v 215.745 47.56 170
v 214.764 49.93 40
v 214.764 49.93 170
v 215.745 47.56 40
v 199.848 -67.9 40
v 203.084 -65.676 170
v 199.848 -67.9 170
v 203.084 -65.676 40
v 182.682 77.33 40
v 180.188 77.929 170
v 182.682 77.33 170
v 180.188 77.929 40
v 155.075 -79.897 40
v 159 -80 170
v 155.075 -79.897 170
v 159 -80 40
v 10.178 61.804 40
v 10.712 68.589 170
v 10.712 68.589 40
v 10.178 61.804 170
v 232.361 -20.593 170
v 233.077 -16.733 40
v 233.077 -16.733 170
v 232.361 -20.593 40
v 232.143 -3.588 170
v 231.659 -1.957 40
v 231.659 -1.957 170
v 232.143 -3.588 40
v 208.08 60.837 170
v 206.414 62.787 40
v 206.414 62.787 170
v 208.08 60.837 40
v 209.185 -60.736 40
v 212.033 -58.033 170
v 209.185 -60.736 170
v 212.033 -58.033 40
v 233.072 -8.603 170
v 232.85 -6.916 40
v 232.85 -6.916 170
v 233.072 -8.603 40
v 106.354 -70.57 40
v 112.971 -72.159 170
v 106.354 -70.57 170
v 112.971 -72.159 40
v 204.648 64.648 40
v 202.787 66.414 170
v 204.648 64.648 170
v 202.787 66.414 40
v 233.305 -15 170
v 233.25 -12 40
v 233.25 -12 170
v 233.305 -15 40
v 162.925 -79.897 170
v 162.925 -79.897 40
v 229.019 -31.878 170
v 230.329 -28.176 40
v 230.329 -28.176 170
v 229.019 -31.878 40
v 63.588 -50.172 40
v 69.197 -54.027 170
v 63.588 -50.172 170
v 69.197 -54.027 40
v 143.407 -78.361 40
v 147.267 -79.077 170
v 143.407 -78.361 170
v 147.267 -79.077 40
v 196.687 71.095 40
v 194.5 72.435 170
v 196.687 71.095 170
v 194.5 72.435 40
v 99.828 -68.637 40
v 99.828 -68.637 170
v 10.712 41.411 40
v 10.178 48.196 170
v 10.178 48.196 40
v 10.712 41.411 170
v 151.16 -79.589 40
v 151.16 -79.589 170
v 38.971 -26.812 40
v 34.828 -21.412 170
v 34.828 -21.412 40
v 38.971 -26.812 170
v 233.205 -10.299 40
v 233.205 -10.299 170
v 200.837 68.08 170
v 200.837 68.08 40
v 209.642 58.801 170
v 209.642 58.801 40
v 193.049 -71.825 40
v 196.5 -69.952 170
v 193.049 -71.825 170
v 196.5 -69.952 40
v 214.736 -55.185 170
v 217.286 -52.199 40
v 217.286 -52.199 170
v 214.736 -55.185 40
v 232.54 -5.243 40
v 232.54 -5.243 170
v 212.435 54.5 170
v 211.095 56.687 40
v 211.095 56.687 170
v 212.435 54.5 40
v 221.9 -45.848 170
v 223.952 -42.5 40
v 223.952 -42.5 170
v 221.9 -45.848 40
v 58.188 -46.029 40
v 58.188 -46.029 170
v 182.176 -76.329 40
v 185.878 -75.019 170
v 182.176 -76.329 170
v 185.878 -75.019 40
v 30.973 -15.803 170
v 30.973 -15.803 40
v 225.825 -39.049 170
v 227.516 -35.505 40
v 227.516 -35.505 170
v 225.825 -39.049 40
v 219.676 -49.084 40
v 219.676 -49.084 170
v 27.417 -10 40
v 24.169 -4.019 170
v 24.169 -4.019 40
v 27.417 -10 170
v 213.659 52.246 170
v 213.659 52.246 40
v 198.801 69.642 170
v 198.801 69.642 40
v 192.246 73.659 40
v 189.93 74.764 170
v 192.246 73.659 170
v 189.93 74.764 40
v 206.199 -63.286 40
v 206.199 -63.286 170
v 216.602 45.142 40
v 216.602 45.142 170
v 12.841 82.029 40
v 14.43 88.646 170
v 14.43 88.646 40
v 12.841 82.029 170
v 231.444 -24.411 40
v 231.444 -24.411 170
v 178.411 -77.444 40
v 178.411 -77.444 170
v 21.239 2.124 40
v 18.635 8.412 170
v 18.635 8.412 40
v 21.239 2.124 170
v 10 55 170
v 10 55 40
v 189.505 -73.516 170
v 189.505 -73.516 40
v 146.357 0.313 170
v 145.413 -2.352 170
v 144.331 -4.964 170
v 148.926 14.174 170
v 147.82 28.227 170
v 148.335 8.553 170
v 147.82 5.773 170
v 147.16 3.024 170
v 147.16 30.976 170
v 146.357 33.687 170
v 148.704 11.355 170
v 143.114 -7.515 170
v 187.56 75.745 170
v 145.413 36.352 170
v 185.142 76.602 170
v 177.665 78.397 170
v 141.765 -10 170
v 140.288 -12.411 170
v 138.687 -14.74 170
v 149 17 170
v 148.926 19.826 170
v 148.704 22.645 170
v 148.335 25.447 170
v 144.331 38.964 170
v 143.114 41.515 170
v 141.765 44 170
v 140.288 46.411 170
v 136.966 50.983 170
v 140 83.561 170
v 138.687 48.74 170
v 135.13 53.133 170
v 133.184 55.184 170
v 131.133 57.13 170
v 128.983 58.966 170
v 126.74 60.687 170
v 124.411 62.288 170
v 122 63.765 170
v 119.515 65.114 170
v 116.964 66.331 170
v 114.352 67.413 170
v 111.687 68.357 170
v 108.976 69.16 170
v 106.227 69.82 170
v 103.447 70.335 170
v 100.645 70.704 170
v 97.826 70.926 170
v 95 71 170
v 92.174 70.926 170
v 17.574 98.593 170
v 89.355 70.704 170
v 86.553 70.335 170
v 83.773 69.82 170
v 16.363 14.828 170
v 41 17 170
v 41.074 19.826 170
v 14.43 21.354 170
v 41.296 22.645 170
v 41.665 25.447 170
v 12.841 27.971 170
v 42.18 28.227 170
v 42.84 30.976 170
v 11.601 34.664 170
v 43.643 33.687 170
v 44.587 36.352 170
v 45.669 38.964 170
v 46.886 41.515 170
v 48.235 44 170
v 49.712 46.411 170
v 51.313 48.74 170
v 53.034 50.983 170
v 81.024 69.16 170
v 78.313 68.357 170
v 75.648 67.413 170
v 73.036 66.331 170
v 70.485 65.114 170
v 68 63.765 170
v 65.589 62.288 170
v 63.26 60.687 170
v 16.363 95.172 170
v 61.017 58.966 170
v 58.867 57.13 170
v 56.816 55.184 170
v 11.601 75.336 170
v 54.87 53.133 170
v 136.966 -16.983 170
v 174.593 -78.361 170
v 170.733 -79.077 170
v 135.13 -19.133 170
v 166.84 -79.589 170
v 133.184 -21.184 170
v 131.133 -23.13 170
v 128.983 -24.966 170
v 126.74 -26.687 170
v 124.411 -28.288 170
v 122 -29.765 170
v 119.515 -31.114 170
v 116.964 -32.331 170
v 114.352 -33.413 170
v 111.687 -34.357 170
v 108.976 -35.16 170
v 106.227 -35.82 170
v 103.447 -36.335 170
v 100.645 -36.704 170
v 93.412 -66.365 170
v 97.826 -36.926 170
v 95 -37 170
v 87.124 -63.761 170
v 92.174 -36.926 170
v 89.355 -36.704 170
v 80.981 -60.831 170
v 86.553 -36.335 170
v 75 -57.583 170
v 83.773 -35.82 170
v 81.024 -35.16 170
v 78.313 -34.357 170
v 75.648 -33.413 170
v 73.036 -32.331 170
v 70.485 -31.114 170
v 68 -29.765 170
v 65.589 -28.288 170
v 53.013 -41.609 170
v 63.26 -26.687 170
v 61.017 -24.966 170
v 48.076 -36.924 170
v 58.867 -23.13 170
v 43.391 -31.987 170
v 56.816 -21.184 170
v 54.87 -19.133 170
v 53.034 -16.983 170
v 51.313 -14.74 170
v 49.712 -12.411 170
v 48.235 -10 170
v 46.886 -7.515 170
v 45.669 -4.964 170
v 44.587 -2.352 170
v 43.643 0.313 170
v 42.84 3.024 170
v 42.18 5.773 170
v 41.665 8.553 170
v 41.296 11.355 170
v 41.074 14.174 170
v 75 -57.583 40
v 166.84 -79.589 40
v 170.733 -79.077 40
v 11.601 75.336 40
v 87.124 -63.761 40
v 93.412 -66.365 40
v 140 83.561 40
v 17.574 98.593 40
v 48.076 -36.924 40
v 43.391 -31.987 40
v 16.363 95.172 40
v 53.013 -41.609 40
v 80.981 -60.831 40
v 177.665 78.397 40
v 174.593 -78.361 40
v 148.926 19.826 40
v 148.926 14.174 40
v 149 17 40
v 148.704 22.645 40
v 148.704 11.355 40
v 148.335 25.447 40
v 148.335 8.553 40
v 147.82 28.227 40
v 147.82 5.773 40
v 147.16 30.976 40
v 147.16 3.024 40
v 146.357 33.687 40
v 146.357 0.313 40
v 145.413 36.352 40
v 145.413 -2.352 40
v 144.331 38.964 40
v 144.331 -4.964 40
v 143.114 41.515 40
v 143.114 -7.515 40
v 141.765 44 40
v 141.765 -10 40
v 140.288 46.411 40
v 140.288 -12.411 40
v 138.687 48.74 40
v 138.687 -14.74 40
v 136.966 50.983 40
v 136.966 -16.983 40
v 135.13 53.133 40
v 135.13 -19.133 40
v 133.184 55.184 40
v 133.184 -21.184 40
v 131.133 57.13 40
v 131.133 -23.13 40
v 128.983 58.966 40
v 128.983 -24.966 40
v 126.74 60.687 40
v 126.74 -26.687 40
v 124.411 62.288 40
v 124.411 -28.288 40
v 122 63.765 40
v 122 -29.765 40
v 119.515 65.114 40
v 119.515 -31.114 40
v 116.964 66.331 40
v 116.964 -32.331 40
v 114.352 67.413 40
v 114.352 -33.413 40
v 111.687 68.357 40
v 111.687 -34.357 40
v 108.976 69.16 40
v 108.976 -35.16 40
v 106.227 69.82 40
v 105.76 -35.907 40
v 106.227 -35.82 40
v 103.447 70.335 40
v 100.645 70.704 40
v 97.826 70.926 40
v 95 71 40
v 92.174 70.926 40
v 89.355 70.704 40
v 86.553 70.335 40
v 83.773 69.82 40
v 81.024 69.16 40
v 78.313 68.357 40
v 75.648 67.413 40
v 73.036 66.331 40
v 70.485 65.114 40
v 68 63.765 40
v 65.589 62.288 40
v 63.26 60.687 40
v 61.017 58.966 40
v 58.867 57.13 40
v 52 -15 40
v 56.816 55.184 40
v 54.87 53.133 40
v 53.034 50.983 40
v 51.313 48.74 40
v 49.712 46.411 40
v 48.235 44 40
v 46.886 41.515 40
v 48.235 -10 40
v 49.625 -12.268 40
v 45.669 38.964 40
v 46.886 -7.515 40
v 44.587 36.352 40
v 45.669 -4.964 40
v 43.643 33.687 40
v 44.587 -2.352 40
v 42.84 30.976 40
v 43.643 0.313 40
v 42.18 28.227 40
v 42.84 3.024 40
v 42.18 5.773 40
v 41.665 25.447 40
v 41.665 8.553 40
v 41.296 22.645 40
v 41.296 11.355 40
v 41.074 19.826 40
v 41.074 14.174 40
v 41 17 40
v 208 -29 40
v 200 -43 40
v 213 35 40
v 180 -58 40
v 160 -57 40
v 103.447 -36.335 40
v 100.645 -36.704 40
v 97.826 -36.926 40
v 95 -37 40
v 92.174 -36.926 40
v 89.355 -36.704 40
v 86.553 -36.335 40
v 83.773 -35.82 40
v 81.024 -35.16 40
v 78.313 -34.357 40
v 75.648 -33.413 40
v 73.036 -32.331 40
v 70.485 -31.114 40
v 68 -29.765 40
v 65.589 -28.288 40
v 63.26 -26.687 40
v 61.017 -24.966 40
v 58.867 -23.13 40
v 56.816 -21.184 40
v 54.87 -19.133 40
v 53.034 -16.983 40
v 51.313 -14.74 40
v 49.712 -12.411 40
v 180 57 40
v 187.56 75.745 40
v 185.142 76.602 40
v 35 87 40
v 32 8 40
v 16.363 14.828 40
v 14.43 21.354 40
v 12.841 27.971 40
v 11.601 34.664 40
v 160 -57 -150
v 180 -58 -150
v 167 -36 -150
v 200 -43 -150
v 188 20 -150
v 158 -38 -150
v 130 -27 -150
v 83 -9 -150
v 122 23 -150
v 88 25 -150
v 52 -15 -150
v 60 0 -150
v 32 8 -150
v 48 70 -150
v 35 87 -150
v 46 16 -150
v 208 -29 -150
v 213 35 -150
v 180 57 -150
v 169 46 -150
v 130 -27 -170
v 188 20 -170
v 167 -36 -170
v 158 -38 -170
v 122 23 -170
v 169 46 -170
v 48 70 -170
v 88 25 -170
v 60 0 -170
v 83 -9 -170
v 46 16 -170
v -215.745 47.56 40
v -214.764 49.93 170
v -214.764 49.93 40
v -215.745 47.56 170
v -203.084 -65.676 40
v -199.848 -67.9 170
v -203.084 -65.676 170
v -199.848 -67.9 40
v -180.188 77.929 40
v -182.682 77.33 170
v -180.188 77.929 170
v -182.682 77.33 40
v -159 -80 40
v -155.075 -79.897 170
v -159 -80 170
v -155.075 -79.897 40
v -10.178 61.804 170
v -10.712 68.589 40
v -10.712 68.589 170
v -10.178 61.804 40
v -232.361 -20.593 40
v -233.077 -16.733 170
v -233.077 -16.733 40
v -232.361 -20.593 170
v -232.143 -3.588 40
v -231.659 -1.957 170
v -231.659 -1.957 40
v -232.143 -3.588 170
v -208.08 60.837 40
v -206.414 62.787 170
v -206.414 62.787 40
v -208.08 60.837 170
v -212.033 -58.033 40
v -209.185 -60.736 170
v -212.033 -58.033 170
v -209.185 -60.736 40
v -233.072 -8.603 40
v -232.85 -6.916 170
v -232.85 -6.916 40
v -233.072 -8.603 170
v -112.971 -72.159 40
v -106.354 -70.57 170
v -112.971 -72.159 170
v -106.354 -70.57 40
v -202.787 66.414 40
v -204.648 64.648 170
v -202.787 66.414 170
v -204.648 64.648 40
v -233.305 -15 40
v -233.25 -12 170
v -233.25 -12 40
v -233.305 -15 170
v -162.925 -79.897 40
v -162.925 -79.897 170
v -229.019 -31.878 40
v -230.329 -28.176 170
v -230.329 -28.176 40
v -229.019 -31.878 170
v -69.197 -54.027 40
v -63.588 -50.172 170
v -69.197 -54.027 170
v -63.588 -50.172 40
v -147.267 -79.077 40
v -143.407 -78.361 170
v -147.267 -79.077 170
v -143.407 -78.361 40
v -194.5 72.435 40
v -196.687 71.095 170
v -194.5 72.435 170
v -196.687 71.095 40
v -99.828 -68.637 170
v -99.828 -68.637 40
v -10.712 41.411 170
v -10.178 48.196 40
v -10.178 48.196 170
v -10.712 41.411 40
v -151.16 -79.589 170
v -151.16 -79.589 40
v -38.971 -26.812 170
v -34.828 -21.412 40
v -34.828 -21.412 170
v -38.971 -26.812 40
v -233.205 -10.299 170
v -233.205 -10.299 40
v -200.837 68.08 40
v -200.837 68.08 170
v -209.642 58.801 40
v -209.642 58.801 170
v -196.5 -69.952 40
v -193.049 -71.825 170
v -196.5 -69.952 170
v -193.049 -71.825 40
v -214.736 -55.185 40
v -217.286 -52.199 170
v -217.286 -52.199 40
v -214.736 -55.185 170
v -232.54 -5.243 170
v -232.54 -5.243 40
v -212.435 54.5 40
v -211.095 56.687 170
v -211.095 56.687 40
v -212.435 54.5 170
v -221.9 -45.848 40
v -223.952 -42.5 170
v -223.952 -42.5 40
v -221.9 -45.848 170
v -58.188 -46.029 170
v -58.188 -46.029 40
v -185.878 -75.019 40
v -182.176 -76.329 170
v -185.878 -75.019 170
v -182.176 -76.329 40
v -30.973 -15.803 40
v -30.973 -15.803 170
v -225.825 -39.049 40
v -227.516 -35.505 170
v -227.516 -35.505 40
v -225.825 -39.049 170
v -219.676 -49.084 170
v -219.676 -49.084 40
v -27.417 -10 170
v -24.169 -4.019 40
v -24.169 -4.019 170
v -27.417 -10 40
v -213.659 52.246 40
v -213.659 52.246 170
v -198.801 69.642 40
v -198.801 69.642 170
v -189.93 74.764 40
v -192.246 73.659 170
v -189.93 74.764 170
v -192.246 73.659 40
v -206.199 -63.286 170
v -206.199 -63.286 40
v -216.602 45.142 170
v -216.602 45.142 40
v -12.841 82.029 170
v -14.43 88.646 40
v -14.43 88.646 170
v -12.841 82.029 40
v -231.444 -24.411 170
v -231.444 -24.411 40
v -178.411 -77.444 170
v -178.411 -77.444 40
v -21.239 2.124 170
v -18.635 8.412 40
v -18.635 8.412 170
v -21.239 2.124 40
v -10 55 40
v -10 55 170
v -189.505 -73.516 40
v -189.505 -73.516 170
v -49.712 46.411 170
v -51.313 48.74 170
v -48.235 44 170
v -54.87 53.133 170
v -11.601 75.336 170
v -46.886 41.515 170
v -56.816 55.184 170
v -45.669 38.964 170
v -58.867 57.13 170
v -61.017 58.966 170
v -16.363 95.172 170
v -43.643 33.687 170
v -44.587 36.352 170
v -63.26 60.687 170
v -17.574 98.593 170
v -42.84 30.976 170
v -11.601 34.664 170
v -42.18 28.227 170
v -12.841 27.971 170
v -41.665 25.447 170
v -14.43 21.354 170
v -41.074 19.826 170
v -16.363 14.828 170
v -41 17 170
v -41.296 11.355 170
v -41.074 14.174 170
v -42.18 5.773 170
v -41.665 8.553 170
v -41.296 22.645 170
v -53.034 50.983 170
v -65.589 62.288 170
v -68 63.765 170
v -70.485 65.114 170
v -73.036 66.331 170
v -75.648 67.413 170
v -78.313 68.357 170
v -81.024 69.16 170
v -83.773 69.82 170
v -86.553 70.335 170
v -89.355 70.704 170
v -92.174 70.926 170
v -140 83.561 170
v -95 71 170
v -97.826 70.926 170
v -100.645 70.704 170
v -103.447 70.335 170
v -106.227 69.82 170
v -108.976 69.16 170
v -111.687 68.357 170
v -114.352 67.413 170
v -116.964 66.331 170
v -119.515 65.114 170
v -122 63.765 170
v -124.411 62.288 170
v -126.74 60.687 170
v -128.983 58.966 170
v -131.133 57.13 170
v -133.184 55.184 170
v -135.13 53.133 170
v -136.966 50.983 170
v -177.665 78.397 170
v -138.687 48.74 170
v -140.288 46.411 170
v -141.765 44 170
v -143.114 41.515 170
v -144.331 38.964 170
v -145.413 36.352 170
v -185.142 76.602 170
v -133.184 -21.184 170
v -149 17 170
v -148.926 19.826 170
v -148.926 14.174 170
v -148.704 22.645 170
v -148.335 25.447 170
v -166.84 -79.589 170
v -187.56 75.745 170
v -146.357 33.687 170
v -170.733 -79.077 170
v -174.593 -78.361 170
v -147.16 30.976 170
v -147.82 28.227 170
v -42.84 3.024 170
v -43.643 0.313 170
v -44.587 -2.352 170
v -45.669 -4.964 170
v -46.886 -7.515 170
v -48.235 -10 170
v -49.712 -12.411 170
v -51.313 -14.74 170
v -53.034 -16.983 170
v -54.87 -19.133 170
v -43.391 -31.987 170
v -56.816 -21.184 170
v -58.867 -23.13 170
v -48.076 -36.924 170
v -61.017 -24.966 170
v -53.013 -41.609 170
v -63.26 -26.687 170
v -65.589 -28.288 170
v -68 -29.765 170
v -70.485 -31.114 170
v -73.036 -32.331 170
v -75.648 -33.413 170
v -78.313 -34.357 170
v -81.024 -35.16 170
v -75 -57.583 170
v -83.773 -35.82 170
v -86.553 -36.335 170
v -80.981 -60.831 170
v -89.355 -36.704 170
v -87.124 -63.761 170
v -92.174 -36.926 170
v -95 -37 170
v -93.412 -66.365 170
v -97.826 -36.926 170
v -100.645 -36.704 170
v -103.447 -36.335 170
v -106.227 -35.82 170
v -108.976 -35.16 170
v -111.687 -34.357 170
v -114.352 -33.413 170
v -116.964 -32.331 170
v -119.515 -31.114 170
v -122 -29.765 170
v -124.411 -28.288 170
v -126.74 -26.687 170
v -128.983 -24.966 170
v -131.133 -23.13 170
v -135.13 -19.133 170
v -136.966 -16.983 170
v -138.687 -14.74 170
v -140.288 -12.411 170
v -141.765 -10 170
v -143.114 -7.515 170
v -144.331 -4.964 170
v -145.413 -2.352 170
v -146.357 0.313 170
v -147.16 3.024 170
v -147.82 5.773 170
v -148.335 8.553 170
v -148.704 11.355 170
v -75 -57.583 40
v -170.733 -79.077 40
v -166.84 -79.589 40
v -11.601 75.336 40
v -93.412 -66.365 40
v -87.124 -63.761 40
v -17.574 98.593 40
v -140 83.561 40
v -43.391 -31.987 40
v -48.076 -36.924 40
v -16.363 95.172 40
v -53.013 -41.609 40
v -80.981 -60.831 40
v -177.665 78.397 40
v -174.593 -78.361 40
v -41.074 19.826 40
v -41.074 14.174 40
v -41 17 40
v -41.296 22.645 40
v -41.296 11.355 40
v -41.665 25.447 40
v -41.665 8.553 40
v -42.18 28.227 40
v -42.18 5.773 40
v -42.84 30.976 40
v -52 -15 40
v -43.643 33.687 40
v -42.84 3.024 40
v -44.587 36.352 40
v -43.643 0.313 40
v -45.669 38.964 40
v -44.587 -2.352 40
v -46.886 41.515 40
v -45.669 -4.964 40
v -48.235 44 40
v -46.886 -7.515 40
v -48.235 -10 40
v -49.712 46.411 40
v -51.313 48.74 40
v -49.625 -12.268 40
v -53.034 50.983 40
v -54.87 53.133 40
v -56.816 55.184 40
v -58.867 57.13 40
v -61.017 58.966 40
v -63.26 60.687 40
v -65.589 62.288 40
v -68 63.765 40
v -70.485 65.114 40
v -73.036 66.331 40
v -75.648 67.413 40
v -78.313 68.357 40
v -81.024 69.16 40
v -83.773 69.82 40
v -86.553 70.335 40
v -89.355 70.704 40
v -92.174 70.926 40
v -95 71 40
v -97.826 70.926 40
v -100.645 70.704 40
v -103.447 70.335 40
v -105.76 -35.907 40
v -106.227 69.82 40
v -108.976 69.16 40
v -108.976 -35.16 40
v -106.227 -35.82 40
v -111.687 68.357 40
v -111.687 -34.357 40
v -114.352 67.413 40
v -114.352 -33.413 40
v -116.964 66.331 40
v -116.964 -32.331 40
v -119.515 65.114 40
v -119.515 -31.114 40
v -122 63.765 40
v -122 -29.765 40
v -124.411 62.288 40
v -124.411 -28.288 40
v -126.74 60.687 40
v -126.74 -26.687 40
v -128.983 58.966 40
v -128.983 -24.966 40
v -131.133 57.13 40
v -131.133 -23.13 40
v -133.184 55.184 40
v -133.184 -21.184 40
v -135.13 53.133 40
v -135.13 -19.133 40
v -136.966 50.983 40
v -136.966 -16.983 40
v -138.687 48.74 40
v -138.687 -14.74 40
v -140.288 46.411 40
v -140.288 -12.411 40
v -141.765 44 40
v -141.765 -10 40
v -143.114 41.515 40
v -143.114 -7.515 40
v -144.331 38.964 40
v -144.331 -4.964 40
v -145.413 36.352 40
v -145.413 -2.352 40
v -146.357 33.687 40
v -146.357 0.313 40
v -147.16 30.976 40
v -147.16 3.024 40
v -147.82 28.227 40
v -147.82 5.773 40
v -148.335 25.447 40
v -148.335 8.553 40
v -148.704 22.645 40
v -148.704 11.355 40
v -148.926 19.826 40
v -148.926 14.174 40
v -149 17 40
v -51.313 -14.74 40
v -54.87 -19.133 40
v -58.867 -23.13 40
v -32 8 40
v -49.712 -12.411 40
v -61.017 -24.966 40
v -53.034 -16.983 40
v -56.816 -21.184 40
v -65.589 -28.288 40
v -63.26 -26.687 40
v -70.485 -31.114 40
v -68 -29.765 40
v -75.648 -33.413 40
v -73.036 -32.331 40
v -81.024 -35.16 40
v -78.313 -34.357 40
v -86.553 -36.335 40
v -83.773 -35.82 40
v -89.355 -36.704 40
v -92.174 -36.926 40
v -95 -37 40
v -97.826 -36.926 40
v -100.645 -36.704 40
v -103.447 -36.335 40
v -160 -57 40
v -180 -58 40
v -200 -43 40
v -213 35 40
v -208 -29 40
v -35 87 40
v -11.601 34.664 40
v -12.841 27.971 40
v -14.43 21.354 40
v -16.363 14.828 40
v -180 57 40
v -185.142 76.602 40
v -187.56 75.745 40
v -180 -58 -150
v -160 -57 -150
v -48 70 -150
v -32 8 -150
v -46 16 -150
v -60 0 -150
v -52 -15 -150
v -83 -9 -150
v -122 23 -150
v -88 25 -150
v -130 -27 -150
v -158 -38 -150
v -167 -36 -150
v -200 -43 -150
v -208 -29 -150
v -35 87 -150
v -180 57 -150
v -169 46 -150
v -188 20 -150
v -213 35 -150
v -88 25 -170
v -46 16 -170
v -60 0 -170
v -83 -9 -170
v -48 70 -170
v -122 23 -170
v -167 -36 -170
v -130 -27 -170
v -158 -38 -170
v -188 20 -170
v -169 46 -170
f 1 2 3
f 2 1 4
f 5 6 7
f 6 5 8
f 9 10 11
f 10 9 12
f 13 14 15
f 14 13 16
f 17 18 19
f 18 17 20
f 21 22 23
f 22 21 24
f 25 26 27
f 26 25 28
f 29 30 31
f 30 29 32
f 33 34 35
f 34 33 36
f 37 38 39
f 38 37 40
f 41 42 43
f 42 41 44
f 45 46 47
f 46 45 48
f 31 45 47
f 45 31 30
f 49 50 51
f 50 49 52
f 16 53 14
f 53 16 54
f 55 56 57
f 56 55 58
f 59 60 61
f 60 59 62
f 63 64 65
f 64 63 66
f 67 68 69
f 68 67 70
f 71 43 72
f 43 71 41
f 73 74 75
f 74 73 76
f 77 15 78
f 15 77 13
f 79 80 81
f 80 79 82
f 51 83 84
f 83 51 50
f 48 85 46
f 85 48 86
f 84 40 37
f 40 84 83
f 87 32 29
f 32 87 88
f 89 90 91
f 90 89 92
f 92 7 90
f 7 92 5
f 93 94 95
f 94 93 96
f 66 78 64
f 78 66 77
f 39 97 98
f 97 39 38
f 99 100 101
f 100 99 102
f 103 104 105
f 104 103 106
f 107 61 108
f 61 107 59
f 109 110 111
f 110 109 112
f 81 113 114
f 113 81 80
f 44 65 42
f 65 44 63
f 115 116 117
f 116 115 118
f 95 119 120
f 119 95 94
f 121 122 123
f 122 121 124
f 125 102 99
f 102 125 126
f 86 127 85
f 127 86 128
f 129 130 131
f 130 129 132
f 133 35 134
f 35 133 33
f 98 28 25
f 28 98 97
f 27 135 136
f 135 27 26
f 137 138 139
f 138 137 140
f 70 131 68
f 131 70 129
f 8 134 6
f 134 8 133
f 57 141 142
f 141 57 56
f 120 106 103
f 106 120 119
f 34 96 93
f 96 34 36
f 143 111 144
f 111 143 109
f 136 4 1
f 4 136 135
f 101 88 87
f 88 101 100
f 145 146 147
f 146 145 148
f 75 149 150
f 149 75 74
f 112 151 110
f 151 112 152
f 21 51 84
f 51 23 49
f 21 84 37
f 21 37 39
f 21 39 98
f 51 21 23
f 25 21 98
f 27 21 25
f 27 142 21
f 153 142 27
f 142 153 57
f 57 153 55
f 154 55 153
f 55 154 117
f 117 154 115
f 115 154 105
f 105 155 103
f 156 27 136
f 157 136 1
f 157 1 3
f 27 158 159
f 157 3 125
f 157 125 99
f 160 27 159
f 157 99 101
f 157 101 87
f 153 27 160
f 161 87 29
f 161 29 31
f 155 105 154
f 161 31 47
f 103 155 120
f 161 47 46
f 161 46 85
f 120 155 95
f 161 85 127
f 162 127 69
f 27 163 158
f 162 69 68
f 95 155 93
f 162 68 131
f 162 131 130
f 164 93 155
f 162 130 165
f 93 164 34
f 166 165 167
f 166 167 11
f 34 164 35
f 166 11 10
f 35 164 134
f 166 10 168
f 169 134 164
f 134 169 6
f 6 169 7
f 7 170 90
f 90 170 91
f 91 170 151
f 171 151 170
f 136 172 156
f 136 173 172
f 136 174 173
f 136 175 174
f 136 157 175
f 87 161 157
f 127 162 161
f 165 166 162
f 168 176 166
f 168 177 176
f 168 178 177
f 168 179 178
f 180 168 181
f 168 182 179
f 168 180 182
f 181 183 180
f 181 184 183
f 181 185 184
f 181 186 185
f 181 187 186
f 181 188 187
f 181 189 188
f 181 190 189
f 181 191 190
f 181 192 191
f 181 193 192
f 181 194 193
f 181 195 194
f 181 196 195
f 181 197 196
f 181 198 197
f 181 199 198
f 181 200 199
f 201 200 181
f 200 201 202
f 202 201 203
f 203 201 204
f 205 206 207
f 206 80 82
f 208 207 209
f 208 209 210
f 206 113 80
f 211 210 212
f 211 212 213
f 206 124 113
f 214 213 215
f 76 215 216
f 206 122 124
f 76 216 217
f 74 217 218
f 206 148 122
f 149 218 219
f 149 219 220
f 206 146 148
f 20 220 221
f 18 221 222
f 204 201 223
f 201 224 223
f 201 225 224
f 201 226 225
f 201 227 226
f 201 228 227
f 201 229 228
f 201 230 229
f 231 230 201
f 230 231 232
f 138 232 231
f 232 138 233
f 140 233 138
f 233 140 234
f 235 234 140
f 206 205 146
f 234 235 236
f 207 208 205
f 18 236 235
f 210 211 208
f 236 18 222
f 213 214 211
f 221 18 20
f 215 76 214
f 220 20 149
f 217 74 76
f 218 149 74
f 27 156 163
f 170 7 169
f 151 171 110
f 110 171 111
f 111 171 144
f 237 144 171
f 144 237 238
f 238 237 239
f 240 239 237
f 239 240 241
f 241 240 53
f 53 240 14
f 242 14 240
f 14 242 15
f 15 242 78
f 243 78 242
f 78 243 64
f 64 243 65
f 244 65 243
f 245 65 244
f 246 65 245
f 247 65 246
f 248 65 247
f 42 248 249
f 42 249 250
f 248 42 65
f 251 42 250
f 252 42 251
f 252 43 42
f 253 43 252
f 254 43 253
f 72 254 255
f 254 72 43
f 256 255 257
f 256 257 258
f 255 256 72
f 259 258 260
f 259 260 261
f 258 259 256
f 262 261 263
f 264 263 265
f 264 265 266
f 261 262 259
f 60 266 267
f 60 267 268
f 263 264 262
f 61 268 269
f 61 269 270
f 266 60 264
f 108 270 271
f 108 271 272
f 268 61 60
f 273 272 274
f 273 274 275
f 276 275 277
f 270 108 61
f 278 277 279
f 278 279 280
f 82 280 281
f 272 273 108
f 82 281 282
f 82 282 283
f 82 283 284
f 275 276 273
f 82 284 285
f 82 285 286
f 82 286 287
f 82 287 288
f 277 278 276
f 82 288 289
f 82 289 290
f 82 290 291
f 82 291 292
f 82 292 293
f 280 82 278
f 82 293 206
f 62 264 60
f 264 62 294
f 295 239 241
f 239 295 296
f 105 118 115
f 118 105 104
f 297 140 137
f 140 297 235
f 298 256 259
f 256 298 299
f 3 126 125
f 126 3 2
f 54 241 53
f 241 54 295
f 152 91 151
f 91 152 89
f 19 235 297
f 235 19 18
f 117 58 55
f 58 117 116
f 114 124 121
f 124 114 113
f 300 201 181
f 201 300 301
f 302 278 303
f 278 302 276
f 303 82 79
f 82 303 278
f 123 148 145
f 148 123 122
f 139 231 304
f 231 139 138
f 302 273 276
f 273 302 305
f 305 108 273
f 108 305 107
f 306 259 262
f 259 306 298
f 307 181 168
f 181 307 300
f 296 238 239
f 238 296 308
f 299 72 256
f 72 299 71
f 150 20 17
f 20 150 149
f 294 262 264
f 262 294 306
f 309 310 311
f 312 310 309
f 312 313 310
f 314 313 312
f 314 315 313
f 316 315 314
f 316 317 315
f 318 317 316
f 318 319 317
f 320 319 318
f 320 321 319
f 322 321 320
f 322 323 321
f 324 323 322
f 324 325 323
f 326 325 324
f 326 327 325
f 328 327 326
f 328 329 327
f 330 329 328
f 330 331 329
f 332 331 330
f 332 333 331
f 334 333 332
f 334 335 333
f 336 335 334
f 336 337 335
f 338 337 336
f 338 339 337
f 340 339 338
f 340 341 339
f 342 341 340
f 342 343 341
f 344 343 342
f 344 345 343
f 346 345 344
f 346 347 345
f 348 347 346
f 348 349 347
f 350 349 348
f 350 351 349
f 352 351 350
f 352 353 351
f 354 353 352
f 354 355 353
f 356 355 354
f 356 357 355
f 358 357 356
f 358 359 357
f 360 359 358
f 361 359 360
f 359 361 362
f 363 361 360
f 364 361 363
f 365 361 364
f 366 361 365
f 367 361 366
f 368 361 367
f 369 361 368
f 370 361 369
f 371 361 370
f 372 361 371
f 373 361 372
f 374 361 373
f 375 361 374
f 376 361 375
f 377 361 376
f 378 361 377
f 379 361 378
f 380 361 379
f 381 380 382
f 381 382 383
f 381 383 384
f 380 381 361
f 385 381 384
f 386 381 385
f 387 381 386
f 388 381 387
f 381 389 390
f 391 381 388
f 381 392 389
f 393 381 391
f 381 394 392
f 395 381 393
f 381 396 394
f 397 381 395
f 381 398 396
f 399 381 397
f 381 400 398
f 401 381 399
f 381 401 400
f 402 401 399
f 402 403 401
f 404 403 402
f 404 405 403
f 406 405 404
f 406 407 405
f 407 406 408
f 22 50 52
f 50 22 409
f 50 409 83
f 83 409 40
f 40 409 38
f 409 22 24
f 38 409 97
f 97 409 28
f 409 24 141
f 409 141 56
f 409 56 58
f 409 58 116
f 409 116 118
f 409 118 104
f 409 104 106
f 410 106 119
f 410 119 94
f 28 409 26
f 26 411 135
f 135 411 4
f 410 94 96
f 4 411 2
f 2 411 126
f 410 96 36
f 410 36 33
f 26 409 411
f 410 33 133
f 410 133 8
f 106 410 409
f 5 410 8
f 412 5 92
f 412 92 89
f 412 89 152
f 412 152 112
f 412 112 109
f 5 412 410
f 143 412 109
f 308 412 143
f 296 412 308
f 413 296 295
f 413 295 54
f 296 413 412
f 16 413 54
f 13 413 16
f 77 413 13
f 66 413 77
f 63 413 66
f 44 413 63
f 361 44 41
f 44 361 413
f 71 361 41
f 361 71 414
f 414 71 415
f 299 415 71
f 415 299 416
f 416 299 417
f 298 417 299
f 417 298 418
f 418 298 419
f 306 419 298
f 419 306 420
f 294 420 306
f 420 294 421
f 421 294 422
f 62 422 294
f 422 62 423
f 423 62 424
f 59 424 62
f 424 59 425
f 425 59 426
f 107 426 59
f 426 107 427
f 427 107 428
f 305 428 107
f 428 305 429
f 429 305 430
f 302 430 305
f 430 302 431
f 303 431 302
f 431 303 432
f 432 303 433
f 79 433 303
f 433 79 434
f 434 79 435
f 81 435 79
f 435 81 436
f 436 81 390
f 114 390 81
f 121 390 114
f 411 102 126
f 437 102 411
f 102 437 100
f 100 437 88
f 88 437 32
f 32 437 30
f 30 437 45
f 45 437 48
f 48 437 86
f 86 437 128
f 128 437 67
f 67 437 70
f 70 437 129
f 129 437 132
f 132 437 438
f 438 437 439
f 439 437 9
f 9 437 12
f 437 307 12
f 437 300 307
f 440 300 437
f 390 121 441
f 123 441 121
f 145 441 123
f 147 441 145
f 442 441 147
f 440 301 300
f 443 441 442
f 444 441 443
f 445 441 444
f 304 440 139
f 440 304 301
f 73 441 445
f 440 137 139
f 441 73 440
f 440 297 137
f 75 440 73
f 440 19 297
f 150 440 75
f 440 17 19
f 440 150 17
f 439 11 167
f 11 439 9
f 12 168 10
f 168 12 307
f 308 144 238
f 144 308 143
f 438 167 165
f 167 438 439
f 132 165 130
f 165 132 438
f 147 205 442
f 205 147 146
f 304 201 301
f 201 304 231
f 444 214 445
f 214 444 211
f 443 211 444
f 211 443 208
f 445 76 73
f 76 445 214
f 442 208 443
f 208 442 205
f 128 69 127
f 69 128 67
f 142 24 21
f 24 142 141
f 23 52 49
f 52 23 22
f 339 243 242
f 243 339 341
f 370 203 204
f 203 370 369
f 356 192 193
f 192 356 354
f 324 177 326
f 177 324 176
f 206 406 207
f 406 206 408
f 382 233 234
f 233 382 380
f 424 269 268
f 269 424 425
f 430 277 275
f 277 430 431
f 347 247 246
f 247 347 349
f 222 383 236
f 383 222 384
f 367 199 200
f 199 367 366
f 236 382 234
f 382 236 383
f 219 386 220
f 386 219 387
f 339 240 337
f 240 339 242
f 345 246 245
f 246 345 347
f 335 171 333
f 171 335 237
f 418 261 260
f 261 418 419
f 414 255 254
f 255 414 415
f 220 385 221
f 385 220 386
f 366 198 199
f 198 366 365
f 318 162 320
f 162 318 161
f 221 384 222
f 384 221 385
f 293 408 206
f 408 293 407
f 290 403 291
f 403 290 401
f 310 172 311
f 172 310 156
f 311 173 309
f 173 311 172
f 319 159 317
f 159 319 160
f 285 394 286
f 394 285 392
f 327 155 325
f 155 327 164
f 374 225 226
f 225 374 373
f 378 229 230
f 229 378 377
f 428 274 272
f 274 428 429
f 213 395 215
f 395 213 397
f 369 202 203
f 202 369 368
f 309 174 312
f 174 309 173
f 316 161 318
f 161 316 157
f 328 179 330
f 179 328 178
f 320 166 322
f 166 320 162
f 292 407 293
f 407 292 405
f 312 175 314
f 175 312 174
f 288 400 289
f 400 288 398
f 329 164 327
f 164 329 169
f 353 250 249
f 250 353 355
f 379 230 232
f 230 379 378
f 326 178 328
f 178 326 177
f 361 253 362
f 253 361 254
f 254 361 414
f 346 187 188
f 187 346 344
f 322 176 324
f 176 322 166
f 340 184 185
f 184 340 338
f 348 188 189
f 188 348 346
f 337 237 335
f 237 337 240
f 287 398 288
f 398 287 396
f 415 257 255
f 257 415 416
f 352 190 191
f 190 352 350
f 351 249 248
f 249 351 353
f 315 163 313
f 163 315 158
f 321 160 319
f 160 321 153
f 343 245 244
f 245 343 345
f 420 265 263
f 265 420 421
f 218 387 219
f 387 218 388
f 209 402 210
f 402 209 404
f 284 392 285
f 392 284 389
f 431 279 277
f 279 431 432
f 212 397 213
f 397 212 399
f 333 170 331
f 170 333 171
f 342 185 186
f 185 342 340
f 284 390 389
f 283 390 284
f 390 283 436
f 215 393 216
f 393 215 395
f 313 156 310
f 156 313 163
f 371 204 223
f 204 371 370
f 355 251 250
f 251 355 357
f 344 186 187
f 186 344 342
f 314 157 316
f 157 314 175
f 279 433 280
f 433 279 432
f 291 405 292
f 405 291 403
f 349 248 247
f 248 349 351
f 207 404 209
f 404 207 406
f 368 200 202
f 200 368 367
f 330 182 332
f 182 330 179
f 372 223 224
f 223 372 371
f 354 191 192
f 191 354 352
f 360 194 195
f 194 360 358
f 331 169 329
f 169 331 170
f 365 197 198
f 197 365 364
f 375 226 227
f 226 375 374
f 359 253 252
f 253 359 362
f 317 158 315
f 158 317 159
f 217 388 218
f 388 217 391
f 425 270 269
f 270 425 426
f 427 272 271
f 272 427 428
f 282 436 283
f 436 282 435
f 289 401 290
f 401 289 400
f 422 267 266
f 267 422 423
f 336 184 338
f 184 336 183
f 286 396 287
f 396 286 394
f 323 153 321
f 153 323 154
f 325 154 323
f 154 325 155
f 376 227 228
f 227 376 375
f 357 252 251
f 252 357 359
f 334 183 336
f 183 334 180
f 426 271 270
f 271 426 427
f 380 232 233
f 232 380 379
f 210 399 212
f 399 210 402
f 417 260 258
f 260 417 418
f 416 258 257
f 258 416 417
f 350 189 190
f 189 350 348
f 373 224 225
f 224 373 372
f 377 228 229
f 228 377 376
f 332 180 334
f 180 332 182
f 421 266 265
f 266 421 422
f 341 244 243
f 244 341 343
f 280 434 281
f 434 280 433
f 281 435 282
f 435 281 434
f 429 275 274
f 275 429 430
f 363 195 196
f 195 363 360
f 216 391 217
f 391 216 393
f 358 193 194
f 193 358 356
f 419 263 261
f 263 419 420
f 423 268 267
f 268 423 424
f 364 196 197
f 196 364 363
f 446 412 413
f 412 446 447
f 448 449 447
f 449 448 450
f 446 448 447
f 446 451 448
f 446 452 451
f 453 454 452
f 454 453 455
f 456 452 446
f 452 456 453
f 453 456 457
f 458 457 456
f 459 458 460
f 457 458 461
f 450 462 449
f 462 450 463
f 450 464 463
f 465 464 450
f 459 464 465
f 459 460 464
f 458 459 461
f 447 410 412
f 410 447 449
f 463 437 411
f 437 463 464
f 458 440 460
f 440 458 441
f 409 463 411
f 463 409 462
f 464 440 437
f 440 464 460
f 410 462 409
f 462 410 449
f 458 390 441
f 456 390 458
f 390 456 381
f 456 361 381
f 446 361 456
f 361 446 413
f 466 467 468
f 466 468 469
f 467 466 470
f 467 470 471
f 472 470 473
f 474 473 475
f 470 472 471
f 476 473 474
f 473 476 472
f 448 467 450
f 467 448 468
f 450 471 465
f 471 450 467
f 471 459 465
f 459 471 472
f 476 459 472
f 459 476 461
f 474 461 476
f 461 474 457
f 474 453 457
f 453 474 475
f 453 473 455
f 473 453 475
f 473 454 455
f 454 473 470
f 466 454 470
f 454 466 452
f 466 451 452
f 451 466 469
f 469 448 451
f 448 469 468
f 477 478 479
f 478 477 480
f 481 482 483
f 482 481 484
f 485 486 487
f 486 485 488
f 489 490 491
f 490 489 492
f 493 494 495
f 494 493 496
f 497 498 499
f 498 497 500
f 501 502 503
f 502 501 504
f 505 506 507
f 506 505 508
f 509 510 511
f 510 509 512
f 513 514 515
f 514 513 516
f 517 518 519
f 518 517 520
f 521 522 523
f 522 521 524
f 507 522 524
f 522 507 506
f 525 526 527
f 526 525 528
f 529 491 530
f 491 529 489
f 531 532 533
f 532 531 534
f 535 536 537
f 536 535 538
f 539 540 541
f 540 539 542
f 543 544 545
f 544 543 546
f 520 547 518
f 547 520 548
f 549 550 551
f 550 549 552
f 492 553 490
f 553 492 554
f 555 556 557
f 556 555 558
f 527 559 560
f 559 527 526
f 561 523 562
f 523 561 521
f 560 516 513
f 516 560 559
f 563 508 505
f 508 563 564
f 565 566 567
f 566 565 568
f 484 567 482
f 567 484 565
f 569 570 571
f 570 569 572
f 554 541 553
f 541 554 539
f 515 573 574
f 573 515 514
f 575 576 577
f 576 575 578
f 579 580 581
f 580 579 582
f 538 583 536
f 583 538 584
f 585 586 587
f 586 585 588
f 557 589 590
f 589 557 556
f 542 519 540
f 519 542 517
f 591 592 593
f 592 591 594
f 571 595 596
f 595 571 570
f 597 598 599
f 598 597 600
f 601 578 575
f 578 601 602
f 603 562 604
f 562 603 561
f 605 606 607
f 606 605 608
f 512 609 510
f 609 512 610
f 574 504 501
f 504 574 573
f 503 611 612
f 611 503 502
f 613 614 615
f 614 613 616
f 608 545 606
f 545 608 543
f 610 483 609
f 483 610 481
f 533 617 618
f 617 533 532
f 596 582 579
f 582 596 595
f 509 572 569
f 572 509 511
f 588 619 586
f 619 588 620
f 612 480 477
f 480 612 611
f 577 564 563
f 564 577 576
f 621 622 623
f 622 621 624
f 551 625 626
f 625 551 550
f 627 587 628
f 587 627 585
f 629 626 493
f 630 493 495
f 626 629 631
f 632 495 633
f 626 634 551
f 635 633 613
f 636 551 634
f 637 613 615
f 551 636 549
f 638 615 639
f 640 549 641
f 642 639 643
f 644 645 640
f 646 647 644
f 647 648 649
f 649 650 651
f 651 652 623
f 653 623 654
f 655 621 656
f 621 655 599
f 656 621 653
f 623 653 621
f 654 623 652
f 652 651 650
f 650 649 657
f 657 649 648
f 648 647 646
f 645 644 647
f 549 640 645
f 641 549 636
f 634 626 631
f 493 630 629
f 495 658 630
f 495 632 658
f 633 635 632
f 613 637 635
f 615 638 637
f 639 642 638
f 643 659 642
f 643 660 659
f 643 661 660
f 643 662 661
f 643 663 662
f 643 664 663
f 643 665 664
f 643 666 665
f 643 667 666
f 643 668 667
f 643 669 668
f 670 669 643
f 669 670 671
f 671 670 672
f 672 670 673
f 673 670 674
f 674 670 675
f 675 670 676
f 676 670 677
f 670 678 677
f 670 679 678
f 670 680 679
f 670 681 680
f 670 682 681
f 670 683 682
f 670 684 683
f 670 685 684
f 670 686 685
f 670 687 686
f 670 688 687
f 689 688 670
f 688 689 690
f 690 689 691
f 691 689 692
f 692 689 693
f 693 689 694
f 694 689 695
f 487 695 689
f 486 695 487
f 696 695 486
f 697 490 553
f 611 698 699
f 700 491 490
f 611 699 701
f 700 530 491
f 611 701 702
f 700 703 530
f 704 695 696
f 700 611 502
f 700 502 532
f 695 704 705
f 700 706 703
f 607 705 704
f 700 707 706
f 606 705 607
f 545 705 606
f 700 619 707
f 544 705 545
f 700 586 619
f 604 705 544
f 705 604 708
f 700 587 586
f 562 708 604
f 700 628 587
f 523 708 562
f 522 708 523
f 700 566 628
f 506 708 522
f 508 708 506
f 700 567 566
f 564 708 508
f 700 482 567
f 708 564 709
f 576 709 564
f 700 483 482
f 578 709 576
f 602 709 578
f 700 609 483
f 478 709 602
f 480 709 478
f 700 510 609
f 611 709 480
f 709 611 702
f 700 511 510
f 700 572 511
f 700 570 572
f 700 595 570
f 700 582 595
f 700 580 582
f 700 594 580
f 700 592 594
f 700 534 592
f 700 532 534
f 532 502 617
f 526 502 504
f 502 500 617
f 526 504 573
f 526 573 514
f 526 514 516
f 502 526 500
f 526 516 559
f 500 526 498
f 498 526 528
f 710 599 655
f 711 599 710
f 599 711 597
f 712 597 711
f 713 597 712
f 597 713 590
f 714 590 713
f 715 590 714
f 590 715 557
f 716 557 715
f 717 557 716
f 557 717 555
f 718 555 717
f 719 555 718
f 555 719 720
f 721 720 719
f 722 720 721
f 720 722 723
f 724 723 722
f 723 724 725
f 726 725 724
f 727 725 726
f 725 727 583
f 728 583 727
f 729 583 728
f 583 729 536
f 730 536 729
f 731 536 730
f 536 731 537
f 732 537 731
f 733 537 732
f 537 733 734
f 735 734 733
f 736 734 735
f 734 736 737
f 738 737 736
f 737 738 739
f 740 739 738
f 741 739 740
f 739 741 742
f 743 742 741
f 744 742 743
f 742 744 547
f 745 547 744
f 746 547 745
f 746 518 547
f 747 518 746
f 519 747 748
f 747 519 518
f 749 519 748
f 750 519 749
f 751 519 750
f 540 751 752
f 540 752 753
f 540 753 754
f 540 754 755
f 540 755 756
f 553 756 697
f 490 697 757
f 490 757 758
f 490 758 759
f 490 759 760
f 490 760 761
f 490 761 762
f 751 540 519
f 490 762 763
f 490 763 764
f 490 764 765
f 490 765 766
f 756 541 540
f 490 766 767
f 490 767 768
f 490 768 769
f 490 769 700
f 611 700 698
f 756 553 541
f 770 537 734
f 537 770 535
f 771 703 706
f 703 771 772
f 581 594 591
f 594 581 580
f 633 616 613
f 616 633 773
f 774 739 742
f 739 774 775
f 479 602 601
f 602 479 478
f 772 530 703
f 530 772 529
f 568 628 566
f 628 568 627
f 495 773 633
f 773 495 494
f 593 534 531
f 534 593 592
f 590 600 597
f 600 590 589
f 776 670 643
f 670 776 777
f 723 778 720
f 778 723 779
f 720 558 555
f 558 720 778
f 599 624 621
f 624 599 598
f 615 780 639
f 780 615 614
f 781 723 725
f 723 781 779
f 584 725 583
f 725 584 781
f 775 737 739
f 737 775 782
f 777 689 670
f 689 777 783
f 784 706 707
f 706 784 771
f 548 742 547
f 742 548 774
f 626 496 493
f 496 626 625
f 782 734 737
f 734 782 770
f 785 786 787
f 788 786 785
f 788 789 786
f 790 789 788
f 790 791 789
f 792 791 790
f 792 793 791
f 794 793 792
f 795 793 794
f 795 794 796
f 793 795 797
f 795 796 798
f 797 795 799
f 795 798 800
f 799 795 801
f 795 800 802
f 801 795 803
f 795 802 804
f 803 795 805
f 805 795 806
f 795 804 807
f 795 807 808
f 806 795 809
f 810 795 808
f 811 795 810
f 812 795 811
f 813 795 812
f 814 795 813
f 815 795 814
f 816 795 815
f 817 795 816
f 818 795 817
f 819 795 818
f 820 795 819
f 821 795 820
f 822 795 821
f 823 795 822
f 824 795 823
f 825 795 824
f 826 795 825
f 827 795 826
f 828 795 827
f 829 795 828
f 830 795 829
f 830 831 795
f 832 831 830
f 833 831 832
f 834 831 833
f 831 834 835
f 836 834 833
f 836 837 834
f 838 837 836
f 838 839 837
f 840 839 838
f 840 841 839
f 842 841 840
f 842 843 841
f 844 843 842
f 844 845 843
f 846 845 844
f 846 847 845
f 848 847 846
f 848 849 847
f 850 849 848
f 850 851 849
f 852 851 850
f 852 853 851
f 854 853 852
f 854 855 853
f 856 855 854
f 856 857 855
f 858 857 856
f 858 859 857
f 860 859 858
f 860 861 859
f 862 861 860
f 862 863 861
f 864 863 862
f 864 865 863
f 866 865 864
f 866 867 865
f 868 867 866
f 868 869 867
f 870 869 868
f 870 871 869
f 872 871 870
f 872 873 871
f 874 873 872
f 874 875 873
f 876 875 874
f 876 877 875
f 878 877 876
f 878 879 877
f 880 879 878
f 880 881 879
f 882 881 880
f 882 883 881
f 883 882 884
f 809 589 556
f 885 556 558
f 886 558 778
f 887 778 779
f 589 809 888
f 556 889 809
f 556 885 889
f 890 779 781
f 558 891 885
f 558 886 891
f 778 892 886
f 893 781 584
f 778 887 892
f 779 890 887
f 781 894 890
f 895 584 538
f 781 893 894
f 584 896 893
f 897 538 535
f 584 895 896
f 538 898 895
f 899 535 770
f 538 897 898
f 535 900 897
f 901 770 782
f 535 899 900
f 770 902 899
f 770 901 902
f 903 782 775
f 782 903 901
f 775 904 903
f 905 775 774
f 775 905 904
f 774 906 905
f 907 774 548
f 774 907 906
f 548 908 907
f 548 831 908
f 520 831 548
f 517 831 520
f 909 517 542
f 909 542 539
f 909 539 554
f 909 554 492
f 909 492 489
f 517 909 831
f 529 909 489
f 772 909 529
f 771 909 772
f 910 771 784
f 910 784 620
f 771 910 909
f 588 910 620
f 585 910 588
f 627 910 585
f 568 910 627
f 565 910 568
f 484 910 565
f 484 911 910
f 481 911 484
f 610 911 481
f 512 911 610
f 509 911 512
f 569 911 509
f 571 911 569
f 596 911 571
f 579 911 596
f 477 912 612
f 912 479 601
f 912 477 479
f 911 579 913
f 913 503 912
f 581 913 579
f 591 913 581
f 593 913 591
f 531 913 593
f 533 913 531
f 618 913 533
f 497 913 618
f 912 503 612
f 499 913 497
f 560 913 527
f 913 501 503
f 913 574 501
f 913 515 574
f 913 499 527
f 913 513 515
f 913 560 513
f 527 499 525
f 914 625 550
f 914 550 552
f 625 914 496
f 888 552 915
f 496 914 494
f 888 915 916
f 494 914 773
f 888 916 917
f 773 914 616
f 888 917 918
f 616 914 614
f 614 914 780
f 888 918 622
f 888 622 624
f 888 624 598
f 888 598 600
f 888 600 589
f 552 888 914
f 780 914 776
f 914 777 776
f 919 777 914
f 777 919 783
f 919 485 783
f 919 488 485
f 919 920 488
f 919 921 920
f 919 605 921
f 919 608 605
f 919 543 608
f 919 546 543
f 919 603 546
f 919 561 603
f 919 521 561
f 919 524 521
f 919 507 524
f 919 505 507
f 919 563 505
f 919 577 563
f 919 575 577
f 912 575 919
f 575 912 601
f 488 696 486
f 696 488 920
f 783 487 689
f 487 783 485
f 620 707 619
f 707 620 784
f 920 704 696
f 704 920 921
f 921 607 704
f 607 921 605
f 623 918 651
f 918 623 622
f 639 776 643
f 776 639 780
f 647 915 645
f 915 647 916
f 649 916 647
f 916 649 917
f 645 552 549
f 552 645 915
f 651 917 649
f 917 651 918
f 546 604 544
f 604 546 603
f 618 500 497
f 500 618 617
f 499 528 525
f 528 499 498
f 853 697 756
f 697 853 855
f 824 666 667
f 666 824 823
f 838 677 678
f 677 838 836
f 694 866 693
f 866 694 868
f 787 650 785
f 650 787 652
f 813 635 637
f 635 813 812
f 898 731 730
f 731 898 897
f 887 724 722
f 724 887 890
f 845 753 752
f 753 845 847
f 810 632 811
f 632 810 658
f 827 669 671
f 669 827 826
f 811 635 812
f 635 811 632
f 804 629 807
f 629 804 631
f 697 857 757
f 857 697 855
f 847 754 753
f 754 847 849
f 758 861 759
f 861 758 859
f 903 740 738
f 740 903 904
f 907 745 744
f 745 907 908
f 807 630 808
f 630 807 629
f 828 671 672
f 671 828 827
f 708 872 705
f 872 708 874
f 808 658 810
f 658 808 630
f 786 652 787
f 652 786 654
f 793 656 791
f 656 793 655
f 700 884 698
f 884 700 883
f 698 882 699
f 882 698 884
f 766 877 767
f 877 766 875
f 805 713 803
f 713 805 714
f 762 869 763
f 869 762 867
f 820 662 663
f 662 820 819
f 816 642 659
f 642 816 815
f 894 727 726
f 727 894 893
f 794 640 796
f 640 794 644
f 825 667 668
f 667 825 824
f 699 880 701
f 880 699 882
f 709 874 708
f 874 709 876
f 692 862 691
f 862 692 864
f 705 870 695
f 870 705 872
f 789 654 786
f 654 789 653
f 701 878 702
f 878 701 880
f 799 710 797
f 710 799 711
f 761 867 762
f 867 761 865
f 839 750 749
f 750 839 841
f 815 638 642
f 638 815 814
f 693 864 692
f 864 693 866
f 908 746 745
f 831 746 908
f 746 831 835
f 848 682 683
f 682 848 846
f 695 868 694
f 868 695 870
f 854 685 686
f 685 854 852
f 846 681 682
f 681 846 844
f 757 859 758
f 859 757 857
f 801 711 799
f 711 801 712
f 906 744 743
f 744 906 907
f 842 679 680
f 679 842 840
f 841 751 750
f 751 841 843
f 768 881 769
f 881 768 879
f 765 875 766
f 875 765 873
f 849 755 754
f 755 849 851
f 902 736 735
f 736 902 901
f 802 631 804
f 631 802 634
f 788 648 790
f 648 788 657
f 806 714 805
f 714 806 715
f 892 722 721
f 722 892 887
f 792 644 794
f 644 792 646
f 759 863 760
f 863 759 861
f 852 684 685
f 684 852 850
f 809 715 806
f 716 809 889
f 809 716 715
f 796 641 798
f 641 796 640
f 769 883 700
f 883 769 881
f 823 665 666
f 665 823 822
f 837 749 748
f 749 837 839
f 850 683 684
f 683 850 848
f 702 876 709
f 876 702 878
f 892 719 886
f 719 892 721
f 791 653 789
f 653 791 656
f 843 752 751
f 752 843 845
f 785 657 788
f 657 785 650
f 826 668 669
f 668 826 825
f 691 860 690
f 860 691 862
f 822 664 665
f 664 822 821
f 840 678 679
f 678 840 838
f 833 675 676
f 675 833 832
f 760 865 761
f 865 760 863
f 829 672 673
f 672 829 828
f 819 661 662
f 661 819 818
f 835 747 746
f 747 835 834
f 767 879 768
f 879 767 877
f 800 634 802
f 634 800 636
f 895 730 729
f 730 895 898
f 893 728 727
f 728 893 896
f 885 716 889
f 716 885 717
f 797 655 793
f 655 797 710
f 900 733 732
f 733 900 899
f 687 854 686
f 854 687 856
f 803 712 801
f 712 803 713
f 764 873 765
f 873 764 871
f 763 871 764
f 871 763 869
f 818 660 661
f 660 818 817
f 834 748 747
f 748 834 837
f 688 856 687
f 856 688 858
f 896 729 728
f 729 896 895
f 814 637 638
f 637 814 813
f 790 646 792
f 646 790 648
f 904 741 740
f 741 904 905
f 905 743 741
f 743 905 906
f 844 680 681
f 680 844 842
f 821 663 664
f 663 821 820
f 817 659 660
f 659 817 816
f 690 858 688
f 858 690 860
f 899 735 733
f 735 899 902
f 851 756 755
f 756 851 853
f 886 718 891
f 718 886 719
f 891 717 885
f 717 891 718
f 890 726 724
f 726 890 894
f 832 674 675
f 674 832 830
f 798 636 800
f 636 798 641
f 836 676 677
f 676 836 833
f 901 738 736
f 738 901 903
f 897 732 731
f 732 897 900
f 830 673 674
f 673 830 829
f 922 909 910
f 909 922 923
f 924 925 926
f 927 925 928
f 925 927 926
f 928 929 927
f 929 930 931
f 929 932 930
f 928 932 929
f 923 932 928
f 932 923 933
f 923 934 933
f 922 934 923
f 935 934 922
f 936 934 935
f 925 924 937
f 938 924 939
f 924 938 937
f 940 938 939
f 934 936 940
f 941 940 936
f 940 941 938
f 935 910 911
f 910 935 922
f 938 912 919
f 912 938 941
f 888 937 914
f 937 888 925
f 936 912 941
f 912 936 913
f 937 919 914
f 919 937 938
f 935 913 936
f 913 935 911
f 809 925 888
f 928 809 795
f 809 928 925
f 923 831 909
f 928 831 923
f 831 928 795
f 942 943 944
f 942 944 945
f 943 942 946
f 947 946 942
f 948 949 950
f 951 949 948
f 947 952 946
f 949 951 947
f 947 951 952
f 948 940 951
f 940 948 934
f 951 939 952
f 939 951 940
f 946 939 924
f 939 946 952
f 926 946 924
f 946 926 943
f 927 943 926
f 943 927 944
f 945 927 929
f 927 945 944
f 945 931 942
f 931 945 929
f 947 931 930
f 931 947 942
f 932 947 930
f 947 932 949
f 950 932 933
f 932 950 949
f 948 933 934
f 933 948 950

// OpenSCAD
// escala 140:465

front();
translate([0,0,-150])back();

scale([-1,1,1]){
    front();
translate([0,0,-150])back();
}


module front(){
    $fn=120;
translate([0,0,40])
difference(){
hull(){
difference(){
translate([159,-5,0])cylinder(d=150,h=130);
translate([0,-15,0])cube([500,500,500]);
}
translate([170,30,0])cylinder(d=98,h=130);
translate([200.75,-12,0])cylinder(d=65,h=130);

difference(){
translate([140,55,0])cylinder(d=260,h=130);
translate([140,-140,0])cube([500,500,500]);
rotate([0,0,-7])
translate([0,100,0])cube([500,500,500]);
}   
}
translate([95,17,-10])cylinder(d=108,h=220);
}
}

module back(){
    linear_extrude(height=190){
    
    polygon([[35,87],[180,57],[213,35],[208,-29],[200,---43],[180,-58],[160,-57],[52,-15],[32,8]]);
}

translate([0,0,-20])
linear_extrude(height=20,convexity=3){
    
    polygon([[48,70],[169,46],[188,20],[167,-36],[158,---38],[130,-27],[122,23],[88,25],[83,-9],[60,0],[46,16]]);
}
}
